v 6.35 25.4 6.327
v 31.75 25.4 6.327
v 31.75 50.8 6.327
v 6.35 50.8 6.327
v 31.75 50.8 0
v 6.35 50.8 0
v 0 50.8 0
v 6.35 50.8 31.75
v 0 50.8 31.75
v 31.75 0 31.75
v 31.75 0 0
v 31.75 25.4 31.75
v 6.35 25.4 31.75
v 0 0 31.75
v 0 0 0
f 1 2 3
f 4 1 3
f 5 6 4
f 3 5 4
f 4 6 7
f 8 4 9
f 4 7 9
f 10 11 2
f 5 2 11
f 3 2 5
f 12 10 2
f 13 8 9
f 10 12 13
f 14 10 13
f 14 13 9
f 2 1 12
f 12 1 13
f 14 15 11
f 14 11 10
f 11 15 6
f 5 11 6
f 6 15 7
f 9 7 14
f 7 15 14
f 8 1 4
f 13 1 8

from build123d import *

# Parameters (mm, degrees)
F0_W     = 25.4
F0_H     = 31.75
F1_DEPTH = 31.75
F2_W     = 6.35
F2_H     = 31.75
F3_DEPTH = 25.4
F4_W     = 25.4
F4_H     = 6.3268248923
F5_DEPTH = 25.4


with BuildPart() as f1:
    # F0 (on Right) → F1 (new body)
    with BuildSketch(Plane.YZ):
        with Locations((12.7, 15.875)):
            Rectangle(F0_W, F0_H)
    extrude(amount=F1_DEPTH)

    # F2 (on face) → F3 (join)
    with BuildSketch(Plane(origin=(0, 25.4, 0), x_dir=(-1, 0, 0), z_dir=(0, 1, 0))):
        with Locations((-3.175, 15.875)):
            Rectangle(F2_W, F2_H)
    extrude(amount=F3_DEPTH)

    # F4 (on face) → F5 (join)
    with BuildSketch(Plane.YZ.offset(6.35)):
        with Locations((38.1, 3.1634124462)):
            Rectangle(F4_W, F4_H)
    extrude(amount=F5_DEPTH)


solid = f1.part
